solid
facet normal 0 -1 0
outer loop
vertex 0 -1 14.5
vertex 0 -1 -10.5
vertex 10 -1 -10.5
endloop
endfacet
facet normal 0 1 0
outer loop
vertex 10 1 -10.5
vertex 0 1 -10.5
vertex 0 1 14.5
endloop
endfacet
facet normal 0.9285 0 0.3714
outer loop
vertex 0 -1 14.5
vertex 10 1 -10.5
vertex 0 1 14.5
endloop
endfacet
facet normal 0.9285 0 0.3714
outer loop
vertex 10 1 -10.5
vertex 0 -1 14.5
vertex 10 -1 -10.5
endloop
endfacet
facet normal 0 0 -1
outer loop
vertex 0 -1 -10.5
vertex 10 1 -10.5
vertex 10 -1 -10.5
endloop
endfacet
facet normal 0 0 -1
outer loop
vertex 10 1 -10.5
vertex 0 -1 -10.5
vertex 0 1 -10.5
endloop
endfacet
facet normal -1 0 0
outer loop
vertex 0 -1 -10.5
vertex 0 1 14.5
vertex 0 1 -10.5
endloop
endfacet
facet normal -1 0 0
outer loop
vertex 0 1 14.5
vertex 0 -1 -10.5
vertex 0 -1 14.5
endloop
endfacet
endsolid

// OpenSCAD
/*
 * Written by Dermot Tynan, Kalopa Research.
 * GPLv2.
 *
 * All dimensions are in mm.
 */

/*
 * Create a buttress to reinforce a vertical column.
 * The height and length specify how high and how far out the
 * buttress goes, and the width is the width of the thing.
 */
module buttress(height, length, width)
{
	phi = atan(length / height);
	cx = length / sin(phi);
	cy = length / cos(phi);
	intersection() {
		rotate(a = [90, 90 - phi, 0])
			cube([cx, cy, width], center = true);
		translate([length/2, 0, cy*sin(phi)/2])
			cube([length, width + 2, height], center = true);
	}
}

buttress(25, 10, 2);
